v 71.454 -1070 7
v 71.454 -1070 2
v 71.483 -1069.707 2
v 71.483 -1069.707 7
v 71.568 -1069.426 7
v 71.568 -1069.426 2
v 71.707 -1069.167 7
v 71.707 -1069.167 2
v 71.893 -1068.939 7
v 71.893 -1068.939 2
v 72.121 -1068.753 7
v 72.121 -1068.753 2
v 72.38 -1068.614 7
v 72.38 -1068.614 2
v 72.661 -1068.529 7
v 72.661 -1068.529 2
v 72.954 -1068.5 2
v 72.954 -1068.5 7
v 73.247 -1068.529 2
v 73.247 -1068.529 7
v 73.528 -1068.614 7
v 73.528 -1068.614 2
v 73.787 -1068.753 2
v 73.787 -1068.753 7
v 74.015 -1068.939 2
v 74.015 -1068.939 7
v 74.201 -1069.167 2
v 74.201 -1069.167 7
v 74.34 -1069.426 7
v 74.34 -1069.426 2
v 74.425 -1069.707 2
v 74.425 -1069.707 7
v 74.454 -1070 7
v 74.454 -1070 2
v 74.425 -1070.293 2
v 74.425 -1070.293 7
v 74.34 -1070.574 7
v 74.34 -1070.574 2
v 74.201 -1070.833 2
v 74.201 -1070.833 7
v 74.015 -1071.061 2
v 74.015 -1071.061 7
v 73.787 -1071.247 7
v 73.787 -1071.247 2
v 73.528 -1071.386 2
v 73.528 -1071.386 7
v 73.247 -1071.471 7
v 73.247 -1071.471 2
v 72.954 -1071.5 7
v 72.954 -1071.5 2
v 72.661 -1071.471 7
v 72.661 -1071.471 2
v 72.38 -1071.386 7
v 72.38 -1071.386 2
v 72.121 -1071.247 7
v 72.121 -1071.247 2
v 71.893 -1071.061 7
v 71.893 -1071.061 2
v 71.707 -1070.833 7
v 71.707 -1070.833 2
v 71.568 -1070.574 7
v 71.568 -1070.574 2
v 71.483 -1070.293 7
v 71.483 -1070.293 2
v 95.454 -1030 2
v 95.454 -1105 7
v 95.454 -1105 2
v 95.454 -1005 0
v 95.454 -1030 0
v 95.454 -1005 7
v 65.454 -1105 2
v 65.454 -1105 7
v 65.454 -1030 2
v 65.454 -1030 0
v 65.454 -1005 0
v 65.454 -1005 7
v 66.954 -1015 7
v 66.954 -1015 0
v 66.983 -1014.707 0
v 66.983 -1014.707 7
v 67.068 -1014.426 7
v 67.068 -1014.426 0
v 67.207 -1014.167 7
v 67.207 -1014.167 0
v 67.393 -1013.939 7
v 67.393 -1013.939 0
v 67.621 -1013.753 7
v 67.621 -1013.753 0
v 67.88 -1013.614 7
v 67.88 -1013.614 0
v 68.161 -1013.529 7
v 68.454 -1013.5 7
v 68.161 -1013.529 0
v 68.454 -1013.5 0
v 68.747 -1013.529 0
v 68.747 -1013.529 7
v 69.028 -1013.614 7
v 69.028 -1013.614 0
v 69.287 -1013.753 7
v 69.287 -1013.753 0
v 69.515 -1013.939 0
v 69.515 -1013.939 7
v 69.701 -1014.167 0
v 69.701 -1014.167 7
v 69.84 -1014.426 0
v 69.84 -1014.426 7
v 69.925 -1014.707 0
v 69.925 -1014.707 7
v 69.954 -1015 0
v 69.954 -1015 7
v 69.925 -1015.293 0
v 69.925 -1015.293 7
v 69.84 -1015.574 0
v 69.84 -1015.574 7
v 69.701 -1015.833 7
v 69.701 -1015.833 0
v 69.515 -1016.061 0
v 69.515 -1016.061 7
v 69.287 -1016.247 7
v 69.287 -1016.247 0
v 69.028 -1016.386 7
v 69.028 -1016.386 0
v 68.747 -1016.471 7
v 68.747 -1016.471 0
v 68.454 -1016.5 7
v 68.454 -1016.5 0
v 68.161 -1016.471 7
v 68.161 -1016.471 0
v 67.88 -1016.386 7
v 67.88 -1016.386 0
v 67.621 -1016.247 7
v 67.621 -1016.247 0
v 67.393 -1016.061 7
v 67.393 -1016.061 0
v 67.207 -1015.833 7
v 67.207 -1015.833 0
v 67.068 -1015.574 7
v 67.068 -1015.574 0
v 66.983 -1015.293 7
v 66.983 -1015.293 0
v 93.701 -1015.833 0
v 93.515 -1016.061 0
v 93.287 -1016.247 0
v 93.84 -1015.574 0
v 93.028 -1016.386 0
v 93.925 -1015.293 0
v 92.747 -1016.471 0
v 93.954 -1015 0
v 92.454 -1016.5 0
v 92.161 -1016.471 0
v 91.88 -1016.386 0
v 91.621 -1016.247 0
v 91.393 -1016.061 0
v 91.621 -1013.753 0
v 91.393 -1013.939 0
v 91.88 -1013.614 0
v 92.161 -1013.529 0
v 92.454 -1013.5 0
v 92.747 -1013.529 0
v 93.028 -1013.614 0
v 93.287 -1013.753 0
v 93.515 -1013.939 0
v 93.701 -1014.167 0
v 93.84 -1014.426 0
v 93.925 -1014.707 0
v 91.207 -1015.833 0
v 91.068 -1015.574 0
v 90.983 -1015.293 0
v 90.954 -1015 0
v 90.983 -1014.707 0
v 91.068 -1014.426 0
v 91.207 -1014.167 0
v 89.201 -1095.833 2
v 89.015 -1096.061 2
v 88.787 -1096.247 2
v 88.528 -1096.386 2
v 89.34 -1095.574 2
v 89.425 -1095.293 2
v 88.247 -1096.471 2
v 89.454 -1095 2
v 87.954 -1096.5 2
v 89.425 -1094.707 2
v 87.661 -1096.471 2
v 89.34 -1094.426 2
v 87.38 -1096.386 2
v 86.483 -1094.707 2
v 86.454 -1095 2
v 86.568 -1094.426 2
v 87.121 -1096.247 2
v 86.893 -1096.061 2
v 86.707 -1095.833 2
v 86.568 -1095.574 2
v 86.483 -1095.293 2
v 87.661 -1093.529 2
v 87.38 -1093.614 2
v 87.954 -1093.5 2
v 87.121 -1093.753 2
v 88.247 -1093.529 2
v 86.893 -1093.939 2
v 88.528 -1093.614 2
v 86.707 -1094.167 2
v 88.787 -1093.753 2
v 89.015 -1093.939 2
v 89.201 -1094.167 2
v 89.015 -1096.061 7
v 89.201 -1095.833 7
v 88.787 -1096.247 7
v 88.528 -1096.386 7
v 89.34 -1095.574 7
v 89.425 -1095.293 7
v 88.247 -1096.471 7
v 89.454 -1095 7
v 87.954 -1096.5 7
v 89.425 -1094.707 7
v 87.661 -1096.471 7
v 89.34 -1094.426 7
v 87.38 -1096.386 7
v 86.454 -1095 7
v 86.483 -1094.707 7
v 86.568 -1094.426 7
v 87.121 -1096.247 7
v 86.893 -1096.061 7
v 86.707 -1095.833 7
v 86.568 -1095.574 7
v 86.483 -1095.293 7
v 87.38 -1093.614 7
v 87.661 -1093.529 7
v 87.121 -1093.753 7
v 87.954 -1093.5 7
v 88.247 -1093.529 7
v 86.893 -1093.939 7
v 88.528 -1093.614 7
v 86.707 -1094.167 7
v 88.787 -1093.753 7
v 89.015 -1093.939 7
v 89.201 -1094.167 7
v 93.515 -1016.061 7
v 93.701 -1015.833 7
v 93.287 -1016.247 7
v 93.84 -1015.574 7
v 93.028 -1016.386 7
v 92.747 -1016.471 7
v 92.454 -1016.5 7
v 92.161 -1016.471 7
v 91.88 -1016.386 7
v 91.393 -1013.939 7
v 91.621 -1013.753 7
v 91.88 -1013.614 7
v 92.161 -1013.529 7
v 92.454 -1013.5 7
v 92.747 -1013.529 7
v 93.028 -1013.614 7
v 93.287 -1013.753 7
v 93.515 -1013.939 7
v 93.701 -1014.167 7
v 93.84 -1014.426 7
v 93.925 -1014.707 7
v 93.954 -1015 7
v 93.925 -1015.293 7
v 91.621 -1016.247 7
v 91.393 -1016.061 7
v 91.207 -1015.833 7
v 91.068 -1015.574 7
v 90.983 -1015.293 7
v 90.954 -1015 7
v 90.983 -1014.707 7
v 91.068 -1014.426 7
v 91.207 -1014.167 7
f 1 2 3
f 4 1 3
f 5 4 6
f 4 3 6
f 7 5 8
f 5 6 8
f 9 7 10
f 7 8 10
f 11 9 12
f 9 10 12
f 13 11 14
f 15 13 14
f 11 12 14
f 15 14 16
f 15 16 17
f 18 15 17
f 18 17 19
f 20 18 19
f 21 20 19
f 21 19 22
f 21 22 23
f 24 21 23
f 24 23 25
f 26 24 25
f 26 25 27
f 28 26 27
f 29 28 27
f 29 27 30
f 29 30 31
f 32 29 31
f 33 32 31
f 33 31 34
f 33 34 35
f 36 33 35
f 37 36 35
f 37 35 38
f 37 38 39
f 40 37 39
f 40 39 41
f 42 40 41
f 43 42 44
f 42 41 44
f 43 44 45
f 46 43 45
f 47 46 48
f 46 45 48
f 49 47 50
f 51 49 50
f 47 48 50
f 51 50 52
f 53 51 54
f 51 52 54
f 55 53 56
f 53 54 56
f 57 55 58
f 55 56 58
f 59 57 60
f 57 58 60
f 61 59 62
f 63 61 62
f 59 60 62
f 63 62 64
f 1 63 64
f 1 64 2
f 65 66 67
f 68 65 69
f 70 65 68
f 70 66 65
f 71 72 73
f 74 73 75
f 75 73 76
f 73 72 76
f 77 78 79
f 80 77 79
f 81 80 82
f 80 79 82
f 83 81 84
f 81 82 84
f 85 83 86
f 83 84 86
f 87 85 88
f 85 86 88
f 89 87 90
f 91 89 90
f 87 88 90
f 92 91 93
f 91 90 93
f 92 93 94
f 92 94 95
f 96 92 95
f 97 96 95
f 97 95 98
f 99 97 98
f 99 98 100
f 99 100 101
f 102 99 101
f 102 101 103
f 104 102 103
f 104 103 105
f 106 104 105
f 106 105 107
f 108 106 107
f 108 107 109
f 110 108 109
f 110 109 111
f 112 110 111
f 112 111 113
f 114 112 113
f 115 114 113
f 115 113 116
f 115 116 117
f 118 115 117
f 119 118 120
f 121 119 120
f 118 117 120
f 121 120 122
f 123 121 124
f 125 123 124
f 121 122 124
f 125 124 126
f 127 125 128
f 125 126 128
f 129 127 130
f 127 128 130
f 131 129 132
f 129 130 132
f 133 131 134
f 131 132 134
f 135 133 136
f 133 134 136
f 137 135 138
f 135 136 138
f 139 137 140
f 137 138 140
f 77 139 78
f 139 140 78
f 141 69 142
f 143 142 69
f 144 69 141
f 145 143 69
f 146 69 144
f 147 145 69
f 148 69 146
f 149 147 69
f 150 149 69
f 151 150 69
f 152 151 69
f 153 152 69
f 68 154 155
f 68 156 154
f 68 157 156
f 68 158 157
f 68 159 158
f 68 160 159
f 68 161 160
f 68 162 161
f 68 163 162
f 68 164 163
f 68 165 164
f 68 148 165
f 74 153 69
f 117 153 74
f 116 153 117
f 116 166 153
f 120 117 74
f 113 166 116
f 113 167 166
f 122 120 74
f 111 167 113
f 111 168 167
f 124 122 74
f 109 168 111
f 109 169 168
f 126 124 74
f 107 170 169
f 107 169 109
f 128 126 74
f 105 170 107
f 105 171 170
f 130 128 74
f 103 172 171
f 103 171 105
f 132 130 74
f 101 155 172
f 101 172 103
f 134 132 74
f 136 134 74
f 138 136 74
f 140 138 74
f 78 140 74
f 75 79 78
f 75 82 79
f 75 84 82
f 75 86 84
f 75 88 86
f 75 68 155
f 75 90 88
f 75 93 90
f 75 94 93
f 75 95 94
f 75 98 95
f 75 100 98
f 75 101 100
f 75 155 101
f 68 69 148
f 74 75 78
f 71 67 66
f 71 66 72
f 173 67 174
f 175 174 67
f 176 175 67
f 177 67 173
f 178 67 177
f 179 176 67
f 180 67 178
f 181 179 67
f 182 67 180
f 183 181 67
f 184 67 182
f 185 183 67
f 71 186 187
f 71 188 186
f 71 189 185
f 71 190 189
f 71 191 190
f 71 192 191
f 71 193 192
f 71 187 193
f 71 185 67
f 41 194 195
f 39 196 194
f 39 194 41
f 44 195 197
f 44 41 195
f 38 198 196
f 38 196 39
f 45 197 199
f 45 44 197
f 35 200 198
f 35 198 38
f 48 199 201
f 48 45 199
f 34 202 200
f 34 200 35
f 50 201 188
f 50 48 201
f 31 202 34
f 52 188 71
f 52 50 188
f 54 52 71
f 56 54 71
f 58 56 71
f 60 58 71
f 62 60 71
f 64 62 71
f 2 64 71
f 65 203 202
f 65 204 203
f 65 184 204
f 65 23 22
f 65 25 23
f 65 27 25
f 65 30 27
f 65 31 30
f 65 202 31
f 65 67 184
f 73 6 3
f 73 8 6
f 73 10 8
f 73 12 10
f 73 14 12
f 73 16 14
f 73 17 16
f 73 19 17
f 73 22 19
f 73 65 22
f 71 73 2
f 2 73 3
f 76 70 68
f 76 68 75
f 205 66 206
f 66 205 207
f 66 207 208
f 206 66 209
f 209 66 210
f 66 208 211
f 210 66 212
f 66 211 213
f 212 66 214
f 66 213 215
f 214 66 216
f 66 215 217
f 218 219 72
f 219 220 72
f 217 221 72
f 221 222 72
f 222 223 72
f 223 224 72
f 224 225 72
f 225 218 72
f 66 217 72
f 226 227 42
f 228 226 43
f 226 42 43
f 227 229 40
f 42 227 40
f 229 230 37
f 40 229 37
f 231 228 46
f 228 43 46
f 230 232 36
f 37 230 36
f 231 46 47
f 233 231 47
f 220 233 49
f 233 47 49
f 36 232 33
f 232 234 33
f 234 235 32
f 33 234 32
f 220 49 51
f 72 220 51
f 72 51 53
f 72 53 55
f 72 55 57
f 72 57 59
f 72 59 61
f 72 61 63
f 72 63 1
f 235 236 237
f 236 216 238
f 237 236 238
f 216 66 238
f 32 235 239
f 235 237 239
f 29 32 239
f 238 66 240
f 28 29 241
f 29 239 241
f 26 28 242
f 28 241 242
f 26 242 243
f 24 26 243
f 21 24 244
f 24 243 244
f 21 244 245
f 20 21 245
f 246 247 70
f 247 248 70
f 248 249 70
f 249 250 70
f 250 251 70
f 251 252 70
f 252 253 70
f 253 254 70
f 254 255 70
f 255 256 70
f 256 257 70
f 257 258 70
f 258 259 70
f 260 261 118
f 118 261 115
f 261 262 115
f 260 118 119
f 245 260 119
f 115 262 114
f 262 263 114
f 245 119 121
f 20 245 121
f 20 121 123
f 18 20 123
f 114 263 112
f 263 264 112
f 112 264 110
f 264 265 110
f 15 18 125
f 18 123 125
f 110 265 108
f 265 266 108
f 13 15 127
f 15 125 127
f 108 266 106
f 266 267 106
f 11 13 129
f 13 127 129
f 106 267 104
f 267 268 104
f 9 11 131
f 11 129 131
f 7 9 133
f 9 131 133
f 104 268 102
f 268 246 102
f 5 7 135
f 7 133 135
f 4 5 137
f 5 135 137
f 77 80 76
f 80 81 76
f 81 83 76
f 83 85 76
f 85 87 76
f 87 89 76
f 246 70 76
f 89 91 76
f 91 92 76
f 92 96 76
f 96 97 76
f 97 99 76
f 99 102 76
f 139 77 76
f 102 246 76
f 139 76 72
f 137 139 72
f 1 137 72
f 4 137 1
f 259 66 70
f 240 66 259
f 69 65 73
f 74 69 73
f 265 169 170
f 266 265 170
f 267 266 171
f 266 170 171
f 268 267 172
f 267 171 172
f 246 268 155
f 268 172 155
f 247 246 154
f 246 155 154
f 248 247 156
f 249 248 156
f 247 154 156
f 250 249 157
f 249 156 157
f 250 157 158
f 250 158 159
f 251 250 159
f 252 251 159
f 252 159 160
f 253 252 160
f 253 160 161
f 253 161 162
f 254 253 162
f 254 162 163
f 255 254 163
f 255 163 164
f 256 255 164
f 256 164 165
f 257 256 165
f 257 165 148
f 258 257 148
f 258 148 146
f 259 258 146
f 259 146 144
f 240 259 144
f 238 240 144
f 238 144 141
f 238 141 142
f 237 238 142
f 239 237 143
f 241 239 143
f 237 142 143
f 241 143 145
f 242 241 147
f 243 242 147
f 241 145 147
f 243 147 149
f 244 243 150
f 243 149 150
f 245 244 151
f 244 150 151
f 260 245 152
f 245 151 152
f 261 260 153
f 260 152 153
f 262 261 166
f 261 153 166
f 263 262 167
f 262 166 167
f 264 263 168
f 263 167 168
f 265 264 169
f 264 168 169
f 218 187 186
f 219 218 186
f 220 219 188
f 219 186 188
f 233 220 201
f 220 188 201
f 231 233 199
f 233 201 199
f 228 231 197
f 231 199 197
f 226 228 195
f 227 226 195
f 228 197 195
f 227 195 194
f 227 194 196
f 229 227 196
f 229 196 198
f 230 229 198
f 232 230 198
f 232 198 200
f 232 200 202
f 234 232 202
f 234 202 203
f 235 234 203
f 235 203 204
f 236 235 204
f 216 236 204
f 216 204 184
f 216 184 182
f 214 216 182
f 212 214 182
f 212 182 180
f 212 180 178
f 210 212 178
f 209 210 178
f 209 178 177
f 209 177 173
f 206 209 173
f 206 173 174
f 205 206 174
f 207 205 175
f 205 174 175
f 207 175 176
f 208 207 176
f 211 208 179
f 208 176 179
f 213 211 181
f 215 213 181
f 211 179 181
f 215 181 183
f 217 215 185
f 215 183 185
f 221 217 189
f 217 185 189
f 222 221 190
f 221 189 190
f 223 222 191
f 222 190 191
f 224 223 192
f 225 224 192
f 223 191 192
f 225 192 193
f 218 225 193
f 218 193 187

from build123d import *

# Parameters (mm, degrees)
SALIENTE_EXTRUIR1_START = 2
SALIENTE_EXTRUIR1_DEPTH = 5
CROQUIS2_W              = 30
CROQUIS2_H              = 25
SALIENTE_EXTRUIR2_DEPTH = 2
CROQUIS3_R              = 1.5
CORTAR_EXTRUIR1_DEPTH   = 10
CROQUIS4_R              = 1.500036904
CROQUIS4_R_2            = 1.5
CORTAR_EXTRUIR2_DEPTH   = 10


with BuildPart() as part:
    # Croquis1 → Saliente-Extruir1 (new body)
    with BuildSketch(Plane.XY.offset(SALIENTE_EXTRUIR1_START)):
        Polygon((65.454041039, -1015), (65.454041039, -1005), (95.454041039, -1005), (95.454041039, -1015), (95.454041039, -1105), (65.454041039, -1105), align=None)
    extrude(amount=SALIENTE_EXTRUIR1_DEPTH)

    # Croquis2 → Saliente-Extruir2 (add)
    with BuildSketch(Plane(origin=(0, 0, 2), x_dir=(-1, 0, 0), z_dir=(0, 0, -1))):
        with Locations((-80.454041039, -1017.5)):
            Rectangle(CROQUIS2_W, CROQUIS2_H)
    extrude(amount=SALIENTE_EXTRUIR2_DEPTH)

    # Croquis3 → Cortar-Extruir1 (cut)
    with BuildSketch(Plane(origin=(0, 0, 2), x_dir=(-1, 0, 0), z_dir=(0, 0, -1))):
        with Locations((-72.954041039, -1070)):
            Circle(CROQUIS3_R)
        with Locations((-87.954041039, -1095)):
            Circle(CROQUIS3_R)
    extrude(amount=-CORTAR_EXTRUIR1_DEPTH, mode=Mode.SUBTRACT)

    # Croquis4 → Cortar-Extruir2 (cut)
    with BuildSketch(Plane(origin=(0, 0, 0), x_dir=(-1, 0, 0), z_dir=(0, 0, -1))):
        with Locations((-92.454041038, -1014.999963096)):
            Circle(CROQUIS4_R)
        with Locations((-68.454041039, -1015)):
            Circle(CROQUIS4_R_2)
    extrude(amount=-CORTAR_EXTRUIR2_DEPTH, mode=Mode.SUBTRACT)


solid = part.part
